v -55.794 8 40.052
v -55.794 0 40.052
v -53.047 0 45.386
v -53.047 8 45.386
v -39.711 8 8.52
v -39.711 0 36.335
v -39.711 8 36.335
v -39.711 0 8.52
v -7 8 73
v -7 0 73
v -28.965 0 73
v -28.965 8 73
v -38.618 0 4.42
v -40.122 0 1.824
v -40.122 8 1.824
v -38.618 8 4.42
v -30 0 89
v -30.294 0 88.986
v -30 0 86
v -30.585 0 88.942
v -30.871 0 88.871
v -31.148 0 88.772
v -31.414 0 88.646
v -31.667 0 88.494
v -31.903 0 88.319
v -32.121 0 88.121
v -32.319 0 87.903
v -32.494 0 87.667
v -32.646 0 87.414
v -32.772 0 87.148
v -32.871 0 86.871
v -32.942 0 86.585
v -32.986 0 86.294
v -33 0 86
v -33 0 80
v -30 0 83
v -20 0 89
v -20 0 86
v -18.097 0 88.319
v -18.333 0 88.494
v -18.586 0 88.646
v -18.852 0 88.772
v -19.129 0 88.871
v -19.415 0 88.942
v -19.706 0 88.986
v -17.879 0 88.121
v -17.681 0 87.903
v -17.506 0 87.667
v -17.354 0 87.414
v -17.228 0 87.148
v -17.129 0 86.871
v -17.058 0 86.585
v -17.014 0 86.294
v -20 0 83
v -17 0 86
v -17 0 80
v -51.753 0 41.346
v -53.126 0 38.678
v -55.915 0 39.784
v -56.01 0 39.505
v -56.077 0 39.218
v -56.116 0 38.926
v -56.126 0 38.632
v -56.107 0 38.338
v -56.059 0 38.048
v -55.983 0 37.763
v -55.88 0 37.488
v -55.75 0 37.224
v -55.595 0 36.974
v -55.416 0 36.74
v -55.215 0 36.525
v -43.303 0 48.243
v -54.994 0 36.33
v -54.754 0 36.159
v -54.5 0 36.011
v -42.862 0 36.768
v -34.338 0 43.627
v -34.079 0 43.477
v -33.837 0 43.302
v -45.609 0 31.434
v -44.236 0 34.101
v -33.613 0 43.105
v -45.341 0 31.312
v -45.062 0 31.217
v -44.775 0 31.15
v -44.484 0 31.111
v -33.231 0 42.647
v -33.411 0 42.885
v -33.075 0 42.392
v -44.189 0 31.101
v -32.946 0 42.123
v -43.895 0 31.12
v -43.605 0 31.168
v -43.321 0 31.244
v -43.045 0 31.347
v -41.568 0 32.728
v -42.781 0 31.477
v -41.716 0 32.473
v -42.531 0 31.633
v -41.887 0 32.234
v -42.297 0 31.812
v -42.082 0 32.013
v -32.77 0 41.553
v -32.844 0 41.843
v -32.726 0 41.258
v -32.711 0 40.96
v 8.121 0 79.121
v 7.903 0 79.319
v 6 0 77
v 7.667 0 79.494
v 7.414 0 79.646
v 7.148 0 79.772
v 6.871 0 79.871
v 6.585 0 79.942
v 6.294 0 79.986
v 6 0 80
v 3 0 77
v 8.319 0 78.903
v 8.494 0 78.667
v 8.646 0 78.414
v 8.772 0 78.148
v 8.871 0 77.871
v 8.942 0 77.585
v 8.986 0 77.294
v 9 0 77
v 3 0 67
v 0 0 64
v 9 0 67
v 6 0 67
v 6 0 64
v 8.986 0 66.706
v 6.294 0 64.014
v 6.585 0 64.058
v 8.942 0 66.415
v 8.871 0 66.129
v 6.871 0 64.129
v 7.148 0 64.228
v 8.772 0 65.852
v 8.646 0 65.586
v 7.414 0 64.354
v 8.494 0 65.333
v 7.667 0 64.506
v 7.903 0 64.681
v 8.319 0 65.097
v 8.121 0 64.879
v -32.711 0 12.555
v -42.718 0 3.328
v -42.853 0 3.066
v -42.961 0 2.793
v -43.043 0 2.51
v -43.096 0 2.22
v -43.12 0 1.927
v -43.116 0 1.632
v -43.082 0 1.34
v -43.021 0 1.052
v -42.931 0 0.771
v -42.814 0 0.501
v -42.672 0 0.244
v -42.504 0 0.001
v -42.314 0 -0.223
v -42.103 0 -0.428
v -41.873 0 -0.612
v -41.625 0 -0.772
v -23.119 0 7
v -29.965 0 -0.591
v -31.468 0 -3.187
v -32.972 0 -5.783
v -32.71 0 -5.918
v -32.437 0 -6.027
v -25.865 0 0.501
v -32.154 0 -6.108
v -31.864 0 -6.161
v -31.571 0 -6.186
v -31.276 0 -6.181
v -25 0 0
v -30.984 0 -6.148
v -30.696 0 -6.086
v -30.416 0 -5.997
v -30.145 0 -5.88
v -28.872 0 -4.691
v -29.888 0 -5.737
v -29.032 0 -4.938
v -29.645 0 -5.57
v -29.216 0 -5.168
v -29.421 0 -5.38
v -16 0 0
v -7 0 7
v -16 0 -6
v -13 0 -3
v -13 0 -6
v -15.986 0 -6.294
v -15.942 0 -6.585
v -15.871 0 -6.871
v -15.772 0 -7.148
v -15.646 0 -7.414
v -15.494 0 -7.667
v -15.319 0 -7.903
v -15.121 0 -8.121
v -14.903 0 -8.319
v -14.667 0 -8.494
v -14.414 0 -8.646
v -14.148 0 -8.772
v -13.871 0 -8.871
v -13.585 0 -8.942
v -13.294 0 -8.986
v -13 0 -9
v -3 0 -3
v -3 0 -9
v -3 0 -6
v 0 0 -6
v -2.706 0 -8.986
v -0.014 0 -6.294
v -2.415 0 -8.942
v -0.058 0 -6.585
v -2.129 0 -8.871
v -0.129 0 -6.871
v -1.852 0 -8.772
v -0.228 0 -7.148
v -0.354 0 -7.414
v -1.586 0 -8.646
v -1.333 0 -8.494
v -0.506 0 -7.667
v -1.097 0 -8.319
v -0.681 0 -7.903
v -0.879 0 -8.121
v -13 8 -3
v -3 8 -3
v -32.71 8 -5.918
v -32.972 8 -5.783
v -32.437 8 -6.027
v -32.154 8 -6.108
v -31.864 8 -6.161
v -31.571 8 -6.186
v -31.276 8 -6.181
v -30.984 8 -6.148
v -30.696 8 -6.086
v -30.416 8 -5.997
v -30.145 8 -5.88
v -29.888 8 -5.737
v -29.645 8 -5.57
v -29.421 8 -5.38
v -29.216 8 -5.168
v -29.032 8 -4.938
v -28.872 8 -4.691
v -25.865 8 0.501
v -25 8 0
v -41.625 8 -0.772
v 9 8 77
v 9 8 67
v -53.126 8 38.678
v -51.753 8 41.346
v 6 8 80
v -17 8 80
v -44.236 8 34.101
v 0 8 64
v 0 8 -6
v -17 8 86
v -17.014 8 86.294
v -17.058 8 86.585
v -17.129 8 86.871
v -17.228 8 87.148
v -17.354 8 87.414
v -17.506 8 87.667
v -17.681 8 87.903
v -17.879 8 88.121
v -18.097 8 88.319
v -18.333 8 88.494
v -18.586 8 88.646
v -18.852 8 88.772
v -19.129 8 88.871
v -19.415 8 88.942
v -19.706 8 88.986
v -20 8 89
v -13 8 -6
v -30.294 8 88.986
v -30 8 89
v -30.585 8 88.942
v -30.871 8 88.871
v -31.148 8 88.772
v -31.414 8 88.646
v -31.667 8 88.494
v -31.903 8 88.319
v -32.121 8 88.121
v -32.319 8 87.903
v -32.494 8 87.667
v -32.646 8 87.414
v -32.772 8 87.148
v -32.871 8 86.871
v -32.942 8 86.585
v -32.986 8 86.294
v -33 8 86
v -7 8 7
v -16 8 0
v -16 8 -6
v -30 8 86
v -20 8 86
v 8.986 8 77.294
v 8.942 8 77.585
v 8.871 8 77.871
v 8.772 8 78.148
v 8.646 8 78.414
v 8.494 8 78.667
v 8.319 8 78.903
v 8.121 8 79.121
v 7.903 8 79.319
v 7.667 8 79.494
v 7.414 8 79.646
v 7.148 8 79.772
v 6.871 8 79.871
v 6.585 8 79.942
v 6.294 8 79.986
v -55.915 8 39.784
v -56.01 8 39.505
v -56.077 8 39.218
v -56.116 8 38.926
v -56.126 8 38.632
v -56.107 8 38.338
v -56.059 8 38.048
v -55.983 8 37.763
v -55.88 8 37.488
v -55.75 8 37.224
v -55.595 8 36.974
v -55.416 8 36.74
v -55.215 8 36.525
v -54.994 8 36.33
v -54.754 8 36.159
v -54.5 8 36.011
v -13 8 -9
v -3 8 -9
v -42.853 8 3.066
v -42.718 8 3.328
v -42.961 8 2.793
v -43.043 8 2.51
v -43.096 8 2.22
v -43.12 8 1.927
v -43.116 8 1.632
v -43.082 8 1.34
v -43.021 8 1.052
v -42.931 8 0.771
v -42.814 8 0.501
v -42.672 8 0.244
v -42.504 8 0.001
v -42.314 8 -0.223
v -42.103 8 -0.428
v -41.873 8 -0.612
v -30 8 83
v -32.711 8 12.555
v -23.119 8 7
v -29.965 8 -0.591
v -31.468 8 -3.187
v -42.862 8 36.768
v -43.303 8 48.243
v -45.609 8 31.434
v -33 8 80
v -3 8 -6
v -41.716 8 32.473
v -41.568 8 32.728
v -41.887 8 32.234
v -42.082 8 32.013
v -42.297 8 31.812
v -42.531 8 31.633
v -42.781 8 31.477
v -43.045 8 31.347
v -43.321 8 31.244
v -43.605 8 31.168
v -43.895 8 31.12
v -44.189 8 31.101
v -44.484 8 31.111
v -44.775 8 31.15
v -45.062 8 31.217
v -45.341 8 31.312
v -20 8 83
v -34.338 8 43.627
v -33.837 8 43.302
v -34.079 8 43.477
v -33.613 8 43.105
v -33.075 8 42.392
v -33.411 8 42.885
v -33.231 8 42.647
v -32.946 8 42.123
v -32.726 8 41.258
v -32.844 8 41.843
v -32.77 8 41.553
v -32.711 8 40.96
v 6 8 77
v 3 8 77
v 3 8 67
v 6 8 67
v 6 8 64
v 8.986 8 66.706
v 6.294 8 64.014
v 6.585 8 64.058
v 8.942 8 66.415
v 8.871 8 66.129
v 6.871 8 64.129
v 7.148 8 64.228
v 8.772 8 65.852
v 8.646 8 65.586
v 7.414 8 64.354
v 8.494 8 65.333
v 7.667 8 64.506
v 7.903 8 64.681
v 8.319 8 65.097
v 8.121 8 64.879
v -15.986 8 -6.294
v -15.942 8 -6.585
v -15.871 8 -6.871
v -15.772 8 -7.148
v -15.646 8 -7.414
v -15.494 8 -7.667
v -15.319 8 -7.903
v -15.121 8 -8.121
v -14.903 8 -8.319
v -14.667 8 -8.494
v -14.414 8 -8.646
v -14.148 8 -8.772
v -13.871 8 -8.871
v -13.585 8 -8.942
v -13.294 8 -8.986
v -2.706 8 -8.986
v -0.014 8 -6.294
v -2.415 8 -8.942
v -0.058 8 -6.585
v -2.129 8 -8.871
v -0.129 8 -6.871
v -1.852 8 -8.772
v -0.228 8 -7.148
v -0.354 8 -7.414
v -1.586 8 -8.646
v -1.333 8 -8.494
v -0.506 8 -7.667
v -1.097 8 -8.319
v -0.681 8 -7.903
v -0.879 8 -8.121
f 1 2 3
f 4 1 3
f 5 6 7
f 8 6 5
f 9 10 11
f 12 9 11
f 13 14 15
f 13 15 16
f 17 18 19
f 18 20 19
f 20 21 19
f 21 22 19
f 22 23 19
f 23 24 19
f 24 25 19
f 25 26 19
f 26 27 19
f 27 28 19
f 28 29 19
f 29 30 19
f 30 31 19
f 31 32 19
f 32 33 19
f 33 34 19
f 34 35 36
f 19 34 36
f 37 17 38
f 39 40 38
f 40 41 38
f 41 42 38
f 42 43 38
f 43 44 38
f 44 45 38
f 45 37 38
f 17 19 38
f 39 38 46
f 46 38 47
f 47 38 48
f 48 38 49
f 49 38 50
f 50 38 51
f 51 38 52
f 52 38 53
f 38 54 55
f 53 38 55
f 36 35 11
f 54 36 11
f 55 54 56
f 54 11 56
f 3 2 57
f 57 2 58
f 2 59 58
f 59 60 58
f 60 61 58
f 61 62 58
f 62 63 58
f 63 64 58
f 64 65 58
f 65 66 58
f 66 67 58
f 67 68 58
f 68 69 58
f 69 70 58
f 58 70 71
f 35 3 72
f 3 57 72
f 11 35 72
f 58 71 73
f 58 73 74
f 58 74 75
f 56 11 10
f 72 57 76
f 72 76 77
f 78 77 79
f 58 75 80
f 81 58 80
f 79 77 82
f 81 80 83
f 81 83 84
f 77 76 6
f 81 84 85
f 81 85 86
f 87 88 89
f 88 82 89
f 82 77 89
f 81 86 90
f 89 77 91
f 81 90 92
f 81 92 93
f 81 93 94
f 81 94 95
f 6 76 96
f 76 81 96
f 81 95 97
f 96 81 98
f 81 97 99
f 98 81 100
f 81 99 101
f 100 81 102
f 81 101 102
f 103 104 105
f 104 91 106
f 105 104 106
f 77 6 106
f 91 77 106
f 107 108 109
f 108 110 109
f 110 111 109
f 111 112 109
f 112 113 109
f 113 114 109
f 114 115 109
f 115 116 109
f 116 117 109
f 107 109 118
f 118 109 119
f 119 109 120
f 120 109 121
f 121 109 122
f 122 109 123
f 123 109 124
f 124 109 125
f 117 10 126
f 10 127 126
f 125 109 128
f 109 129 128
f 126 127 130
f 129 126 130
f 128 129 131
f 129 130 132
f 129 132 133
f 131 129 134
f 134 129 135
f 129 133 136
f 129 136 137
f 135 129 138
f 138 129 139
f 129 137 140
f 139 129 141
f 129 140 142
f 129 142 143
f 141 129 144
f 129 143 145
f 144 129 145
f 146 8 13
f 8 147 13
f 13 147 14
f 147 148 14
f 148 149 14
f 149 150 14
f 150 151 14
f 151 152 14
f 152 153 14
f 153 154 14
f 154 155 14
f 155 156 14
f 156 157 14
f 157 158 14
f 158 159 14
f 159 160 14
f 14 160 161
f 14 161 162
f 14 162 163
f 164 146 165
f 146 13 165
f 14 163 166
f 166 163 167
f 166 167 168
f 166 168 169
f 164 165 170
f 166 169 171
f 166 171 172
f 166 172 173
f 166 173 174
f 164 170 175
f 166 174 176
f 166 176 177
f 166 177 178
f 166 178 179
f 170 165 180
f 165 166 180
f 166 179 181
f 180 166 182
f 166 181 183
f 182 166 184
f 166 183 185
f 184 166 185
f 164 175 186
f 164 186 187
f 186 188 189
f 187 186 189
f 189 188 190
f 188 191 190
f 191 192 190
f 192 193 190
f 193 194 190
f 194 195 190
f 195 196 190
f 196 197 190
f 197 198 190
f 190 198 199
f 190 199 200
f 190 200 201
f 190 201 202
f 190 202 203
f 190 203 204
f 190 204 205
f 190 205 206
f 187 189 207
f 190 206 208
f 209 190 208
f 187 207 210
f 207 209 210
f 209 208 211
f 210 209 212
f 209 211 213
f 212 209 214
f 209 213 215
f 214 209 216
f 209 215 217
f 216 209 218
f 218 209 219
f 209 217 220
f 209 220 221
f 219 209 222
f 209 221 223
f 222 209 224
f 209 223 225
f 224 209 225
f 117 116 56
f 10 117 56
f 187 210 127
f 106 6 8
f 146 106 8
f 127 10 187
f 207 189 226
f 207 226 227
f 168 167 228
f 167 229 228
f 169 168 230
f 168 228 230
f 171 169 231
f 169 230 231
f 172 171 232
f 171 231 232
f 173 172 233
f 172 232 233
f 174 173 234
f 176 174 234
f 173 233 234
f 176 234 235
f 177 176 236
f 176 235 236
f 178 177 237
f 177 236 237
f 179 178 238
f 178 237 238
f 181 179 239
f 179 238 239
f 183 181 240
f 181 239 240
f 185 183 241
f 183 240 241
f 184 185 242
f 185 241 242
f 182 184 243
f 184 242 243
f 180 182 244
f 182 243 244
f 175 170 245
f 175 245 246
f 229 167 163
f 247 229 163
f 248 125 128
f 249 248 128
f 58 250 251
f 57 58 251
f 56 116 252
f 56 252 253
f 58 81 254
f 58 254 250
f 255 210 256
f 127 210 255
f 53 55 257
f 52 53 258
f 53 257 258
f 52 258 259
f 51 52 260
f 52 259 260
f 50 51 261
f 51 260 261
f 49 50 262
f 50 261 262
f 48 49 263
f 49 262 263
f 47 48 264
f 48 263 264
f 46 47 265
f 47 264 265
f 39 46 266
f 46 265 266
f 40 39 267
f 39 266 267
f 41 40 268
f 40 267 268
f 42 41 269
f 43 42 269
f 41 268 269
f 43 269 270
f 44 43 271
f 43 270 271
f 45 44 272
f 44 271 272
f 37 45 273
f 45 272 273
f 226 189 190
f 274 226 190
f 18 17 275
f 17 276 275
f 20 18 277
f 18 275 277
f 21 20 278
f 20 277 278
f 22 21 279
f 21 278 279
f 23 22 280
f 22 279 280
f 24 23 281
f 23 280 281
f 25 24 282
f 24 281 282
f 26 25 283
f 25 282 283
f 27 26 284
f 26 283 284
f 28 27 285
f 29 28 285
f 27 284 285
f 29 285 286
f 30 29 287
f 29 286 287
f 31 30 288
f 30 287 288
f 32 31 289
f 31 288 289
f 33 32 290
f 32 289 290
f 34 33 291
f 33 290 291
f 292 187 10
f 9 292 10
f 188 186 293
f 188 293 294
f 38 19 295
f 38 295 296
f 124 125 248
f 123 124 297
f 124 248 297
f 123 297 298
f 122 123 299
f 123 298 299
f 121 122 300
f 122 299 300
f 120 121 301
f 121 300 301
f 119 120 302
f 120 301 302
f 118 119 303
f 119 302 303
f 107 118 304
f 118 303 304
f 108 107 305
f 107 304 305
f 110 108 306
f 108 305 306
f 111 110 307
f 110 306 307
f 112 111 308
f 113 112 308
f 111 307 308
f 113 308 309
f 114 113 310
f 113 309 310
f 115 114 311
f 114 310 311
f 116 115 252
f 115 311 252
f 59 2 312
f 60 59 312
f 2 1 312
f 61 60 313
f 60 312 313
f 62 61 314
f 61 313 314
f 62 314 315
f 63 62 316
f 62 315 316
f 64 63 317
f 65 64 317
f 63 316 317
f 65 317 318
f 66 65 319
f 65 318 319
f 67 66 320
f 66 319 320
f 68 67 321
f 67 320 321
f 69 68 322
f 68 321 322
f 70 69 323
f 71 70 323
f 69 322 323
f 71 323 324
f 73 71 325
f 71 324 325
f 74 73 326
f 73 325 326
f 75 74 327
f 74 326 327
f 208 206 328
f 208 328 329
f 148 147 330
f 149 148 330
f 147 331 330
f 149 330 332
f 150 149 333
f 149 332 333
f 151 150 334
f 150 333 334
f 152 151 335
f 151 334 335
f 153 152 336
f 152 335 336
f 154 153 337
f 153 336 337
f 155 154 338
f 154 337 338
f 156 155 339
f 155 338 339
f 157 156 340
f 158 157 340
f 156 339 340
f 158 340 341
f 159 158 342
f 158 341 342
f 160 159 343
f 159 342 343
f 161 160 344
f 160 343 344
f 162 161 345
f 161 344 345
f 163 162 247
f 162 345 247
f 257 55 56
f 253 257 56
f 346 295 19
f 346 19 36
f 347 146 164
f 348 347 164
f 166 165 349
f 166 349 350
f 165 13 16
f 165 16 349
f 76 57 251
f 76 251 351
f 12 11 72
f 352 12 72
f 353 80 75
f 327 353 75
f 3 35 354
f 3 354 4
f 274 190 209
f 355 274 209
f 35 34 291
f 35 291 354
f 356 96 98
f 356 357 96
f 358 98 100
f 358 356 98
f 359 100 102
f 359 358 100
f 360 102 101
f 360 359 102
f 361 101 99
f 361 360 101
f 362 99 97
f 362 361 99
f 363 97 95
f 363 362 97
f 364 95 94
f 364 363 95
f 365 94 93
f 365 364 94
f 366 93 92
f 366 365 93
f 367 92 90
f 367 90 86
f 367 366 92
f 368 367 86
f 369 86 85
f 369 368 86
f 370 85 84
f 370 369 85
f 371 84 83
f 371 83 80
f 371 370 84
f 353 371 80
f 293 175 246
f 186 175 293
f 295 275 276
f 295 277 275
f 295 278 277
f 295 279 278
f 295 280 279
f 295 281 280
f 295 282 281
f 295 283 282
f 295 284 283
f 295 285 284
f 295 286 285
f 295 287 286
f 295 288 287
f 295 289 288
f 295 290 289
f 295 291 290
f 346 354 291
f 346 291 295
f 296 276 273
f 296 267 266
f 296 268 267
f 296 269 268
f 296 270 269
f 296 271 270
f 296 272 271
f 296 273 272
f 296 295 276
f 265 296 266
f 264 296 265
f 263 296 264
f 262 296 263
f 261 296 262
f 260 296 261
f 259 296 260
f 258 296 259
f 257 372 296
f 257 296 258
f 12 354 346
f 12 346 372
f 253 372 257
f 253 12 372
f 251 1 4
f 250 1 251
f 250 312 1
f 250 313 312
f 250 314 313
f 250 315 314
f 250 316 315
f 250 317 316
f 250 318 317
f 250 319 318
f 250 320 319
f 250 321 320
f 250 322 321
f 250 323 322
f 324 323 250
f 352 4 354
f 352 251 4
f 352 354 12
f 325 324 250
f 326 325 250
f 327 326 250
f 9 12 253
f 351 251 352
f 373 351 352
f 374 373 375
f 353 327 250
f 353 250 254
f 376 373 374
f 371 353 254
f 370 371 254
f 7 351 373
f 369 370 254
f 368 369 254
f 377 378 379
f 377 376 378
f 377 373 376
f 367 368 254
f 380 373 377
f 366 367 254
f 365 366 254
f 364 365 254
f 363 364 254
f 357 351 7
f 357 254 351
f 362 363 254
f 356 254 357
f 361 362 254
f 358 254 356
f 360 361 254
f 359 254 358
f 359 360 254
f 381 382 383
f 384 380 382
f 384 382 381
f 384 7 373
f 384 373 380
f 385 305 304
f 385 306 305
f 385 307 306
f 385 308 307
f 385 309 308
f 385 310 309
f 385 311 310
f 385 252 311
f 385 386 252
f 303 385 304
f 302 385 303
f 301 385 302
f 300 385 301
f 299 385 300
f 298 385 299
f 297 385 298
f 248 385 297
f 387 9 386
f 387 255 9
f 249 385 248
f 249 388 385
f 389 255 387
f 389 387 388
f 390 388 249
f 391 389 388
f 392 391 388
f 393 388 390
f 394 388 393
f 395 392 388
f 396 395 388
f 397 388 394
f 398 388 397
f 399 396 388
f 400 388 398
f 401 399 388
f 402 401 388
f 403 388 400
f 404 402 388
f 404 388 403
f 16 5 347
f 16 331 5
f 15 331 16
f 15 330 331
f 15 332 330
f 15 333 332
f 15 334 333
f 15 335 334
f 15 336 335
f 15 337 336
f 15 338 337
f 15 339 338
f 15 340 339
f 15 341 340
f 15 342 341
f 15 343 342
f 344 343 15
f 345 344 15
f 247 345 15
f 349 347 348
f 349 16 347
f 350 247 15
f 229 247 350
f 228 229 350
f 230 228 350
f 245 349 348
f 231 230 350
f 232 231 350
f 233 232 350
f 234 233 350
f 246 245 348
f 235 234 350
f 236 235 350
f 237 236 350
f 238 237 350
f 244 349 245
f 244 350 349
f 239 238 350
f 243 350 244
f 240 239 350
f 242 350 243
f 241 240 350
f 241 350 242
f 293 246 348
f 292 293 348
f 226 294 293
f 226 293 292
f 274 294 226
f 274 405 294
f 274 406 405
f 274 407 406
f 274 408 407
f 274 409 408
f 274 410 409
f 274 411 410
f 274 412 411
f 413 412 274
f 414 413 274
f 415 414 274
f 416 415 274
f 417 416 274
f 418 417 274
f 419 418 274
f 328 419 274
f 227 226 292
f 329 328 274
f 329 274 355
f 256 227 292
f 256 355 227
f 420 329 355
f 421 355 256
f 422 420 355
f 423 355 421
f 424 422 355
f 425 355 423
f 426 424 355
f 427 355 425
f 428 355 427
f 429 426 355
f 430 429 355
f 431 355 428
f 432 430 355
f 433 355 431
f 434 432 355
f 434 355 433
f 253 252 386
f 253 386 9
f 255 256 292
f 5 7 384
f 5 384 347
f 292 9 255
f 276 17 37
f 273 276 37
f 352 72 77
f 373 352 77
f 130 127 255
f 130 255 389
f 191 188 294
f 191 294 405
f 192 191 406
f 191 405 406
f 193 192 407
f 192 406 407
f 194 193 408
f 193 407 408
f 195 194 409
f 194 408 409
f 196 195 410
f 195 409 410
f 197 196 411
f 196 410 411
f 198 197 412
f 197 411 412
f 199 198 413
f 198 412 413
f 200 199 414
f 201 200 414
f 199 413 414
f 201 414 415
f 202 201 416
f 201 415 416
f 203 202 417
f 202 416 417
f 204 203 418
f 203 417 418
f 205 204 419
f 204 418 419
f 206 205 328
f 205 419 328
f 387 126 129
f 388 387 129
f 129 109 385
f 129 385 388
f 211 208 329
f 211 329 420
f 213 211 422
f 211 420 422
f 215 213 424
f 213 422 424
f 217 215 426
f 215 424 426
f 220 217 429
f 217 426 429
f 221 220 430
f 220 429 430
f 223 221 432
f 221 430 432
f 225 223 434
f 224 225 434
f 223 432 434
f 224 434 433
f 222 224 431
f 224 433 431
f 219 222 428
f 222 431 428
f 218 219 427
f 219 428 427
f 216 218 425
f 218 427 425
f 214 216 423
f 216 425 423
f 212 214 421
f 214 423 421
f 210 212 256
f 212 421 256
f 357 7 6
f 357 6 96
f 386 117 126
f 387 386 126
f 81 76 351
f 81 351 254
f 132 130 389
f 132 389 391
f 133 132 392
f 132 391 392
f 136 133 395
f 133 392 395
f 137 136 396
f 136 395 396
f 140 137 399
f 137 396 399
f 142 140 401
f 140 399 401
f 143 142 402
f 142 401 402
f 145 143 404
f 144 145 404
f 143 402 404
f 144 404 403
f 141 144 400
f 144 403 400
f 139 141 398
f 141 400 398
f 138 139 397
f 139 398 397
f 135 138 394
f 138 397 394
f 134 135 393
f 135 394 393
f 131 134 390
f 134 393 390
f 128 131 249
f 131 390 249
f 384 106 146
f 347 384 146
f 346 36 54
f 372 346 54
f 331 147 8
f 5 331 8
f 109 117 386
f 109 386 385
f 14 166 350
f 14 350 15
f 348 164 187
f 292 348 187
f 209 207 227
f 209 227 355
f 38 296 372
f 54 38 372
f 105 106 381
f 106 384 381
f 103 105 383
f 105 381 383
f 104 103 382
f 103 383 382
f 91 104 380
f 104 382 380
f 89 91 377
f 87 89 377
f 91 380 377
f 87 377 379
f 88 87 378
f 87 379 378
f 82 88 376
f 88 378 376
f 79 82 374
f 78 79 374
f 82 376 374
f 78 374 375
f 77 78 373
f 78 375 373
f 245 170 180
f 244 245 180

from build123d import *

# Parameters (mm, degrees)
BOSS_EXTRUDE1_DEPTH = 8
SKETCH2_W           = 16
SKETCH2_H           = 9
SKETCH2_W_2         = 10
SKETCH2_H_2         = 3
SKETCH2_W_3         = 9
SKETCH2_H_3         = 16
SKETCH2_W_4         = 3
SKETCH2_H_4         = 10
BOSS_EXTRUDE2_DEPTH = 8
FILLET1_R           = 3


with BuildPart() as part:
    # Sketch1 → Boss-Extrude1 (new body)
    with BuildSketch(Plane(origin=(0, 0, 0), x_dir=(1, 0, 0), z_dir=(0, 1, 0))):
        Polygon((-25, 0), (0, 0), (0, -80), (-33, -80), (-53.047096556, -45.386217778), (-39.710857444, -38.520016036), (-39.710857444, -8.520016036), align=None)
        Polygon((-23.119252614, -7), (-7, -7), (-7, -73), (-28.964892735, -73), (-43.303341696, -48.242901217), (-32.710857444, -42.789329696), (-32.710857444, -12.555123301), align=None, mode=Mode.SUBTRACT)
    extrude(amount=BOSS_EXTRUDE1_DEPTH)

    # Sketch2 → Boss-Extrude2 (add)
    # profile 1 of 5: a face of its own
    with BuildSketch(Plane(origin=(0, 0, 0), x_dir=(1, 0, 0), z_dir=(0, 1, 0))):
        Polygon((-53.047096556, -45.386217778), (-38.821774837, -38.062269253), (-42.941495882, -30.060525786), (-57.166817601, -37.384474311), align=None)
        Polygon((-51.753089082, -41.345729608), (-42.862263008, -36.768261779), (-44.235503356, -34.101013957), (-53.12632943, -38.678481785), align=None, mode=Mode.SUBTRACT)
    # profile 2 of 5: a face of its own
    with BuildSketch(Plane(origin=(0, 0, 0), x_dir=(1, 0, 0), z_dir=(0, 1, 0))):
        Polygon((-39.710857444, -8.520016036), (-25.865344556, -0.501177414), (-30.375941281, 7.286923586), (-44.221454169, -0.731915036), align=None)
        Polygon((-38.618356019, -4.420450128), (-29.964910464, 0.591324011), (-31.468442706, 3.187357678), (-40.121888261, -1.824416461), align=None, mode=Mode.SUBTRACT)
    # profile 3 of 5: a face of its own
    with BuildSketch(Plane(origin=(0, 0, 0), x_dir=(1, 0, 0), z_dir=(0, 1, 0))):
        with Locations((-8, 4.5)):
            Rectangle(SKETCH2_W, SKETCH2_H)
        with Locations((-8, 4.5)):
            Rectangle(SKETCH2_W_2, SKETCH2_H_2, mode=Mode.SUBTRACT)
    # profile 4 of 5: a face of its own
    with BuildSketch(Plane(origin=(0, 0, 0), x_dir=(1, 0, 0), z_dir=(0, 1, 0))):
        with Locations((-25, -84.5)):
            Rectangle(SKETCH2_W, SKETCH2_H)
        with Locations((-25, -84.5)):
            Rectangle(SKETCH2_W_2, SKETCH2_H_2, mode=Mode.SUBTRACT)
    # profile 5 of 5: a face of its own
    with BuildSketch(Plane(origin=(0, 0, 0), x_dir=(1, 0, 0), z_dir=(0, 1, 0))):
        with Locations((4.5, -72)):
            Rectangle(SKETCH2_W_3, SKETCH2_H_3)
        with Locations((4.5, -72)):
            Rectangle(SKETCH2_W_4, SKETCH2_H_4, mode=Mode.SUBTRACT)
    extrude(amount=BOSS_EXTRUDE2_DEPTH)

    # Fillet1
    fillet1_edges = [part.edges().sort_by_distance(p)[0] for p in [
        (0, 4, -9),
        (-16, 4, -9),
        (9, 4, 64),
        (9, 4, 80),
        (-32.710857444, 4, 42.789329696),
        (-42.941495882, 4, 30.060525786),
        (-57.166817601, 4, 37.384474311),
        (-30.375941281, 4, -7.286923586),
        (-44.221454169, 4, 0.731915036),
        (-17, 4, 89),
        (-33, 4, 89),
    ]]
    fillet(fillet1_edges, radius=FILLET1_R)


solid = part.part
